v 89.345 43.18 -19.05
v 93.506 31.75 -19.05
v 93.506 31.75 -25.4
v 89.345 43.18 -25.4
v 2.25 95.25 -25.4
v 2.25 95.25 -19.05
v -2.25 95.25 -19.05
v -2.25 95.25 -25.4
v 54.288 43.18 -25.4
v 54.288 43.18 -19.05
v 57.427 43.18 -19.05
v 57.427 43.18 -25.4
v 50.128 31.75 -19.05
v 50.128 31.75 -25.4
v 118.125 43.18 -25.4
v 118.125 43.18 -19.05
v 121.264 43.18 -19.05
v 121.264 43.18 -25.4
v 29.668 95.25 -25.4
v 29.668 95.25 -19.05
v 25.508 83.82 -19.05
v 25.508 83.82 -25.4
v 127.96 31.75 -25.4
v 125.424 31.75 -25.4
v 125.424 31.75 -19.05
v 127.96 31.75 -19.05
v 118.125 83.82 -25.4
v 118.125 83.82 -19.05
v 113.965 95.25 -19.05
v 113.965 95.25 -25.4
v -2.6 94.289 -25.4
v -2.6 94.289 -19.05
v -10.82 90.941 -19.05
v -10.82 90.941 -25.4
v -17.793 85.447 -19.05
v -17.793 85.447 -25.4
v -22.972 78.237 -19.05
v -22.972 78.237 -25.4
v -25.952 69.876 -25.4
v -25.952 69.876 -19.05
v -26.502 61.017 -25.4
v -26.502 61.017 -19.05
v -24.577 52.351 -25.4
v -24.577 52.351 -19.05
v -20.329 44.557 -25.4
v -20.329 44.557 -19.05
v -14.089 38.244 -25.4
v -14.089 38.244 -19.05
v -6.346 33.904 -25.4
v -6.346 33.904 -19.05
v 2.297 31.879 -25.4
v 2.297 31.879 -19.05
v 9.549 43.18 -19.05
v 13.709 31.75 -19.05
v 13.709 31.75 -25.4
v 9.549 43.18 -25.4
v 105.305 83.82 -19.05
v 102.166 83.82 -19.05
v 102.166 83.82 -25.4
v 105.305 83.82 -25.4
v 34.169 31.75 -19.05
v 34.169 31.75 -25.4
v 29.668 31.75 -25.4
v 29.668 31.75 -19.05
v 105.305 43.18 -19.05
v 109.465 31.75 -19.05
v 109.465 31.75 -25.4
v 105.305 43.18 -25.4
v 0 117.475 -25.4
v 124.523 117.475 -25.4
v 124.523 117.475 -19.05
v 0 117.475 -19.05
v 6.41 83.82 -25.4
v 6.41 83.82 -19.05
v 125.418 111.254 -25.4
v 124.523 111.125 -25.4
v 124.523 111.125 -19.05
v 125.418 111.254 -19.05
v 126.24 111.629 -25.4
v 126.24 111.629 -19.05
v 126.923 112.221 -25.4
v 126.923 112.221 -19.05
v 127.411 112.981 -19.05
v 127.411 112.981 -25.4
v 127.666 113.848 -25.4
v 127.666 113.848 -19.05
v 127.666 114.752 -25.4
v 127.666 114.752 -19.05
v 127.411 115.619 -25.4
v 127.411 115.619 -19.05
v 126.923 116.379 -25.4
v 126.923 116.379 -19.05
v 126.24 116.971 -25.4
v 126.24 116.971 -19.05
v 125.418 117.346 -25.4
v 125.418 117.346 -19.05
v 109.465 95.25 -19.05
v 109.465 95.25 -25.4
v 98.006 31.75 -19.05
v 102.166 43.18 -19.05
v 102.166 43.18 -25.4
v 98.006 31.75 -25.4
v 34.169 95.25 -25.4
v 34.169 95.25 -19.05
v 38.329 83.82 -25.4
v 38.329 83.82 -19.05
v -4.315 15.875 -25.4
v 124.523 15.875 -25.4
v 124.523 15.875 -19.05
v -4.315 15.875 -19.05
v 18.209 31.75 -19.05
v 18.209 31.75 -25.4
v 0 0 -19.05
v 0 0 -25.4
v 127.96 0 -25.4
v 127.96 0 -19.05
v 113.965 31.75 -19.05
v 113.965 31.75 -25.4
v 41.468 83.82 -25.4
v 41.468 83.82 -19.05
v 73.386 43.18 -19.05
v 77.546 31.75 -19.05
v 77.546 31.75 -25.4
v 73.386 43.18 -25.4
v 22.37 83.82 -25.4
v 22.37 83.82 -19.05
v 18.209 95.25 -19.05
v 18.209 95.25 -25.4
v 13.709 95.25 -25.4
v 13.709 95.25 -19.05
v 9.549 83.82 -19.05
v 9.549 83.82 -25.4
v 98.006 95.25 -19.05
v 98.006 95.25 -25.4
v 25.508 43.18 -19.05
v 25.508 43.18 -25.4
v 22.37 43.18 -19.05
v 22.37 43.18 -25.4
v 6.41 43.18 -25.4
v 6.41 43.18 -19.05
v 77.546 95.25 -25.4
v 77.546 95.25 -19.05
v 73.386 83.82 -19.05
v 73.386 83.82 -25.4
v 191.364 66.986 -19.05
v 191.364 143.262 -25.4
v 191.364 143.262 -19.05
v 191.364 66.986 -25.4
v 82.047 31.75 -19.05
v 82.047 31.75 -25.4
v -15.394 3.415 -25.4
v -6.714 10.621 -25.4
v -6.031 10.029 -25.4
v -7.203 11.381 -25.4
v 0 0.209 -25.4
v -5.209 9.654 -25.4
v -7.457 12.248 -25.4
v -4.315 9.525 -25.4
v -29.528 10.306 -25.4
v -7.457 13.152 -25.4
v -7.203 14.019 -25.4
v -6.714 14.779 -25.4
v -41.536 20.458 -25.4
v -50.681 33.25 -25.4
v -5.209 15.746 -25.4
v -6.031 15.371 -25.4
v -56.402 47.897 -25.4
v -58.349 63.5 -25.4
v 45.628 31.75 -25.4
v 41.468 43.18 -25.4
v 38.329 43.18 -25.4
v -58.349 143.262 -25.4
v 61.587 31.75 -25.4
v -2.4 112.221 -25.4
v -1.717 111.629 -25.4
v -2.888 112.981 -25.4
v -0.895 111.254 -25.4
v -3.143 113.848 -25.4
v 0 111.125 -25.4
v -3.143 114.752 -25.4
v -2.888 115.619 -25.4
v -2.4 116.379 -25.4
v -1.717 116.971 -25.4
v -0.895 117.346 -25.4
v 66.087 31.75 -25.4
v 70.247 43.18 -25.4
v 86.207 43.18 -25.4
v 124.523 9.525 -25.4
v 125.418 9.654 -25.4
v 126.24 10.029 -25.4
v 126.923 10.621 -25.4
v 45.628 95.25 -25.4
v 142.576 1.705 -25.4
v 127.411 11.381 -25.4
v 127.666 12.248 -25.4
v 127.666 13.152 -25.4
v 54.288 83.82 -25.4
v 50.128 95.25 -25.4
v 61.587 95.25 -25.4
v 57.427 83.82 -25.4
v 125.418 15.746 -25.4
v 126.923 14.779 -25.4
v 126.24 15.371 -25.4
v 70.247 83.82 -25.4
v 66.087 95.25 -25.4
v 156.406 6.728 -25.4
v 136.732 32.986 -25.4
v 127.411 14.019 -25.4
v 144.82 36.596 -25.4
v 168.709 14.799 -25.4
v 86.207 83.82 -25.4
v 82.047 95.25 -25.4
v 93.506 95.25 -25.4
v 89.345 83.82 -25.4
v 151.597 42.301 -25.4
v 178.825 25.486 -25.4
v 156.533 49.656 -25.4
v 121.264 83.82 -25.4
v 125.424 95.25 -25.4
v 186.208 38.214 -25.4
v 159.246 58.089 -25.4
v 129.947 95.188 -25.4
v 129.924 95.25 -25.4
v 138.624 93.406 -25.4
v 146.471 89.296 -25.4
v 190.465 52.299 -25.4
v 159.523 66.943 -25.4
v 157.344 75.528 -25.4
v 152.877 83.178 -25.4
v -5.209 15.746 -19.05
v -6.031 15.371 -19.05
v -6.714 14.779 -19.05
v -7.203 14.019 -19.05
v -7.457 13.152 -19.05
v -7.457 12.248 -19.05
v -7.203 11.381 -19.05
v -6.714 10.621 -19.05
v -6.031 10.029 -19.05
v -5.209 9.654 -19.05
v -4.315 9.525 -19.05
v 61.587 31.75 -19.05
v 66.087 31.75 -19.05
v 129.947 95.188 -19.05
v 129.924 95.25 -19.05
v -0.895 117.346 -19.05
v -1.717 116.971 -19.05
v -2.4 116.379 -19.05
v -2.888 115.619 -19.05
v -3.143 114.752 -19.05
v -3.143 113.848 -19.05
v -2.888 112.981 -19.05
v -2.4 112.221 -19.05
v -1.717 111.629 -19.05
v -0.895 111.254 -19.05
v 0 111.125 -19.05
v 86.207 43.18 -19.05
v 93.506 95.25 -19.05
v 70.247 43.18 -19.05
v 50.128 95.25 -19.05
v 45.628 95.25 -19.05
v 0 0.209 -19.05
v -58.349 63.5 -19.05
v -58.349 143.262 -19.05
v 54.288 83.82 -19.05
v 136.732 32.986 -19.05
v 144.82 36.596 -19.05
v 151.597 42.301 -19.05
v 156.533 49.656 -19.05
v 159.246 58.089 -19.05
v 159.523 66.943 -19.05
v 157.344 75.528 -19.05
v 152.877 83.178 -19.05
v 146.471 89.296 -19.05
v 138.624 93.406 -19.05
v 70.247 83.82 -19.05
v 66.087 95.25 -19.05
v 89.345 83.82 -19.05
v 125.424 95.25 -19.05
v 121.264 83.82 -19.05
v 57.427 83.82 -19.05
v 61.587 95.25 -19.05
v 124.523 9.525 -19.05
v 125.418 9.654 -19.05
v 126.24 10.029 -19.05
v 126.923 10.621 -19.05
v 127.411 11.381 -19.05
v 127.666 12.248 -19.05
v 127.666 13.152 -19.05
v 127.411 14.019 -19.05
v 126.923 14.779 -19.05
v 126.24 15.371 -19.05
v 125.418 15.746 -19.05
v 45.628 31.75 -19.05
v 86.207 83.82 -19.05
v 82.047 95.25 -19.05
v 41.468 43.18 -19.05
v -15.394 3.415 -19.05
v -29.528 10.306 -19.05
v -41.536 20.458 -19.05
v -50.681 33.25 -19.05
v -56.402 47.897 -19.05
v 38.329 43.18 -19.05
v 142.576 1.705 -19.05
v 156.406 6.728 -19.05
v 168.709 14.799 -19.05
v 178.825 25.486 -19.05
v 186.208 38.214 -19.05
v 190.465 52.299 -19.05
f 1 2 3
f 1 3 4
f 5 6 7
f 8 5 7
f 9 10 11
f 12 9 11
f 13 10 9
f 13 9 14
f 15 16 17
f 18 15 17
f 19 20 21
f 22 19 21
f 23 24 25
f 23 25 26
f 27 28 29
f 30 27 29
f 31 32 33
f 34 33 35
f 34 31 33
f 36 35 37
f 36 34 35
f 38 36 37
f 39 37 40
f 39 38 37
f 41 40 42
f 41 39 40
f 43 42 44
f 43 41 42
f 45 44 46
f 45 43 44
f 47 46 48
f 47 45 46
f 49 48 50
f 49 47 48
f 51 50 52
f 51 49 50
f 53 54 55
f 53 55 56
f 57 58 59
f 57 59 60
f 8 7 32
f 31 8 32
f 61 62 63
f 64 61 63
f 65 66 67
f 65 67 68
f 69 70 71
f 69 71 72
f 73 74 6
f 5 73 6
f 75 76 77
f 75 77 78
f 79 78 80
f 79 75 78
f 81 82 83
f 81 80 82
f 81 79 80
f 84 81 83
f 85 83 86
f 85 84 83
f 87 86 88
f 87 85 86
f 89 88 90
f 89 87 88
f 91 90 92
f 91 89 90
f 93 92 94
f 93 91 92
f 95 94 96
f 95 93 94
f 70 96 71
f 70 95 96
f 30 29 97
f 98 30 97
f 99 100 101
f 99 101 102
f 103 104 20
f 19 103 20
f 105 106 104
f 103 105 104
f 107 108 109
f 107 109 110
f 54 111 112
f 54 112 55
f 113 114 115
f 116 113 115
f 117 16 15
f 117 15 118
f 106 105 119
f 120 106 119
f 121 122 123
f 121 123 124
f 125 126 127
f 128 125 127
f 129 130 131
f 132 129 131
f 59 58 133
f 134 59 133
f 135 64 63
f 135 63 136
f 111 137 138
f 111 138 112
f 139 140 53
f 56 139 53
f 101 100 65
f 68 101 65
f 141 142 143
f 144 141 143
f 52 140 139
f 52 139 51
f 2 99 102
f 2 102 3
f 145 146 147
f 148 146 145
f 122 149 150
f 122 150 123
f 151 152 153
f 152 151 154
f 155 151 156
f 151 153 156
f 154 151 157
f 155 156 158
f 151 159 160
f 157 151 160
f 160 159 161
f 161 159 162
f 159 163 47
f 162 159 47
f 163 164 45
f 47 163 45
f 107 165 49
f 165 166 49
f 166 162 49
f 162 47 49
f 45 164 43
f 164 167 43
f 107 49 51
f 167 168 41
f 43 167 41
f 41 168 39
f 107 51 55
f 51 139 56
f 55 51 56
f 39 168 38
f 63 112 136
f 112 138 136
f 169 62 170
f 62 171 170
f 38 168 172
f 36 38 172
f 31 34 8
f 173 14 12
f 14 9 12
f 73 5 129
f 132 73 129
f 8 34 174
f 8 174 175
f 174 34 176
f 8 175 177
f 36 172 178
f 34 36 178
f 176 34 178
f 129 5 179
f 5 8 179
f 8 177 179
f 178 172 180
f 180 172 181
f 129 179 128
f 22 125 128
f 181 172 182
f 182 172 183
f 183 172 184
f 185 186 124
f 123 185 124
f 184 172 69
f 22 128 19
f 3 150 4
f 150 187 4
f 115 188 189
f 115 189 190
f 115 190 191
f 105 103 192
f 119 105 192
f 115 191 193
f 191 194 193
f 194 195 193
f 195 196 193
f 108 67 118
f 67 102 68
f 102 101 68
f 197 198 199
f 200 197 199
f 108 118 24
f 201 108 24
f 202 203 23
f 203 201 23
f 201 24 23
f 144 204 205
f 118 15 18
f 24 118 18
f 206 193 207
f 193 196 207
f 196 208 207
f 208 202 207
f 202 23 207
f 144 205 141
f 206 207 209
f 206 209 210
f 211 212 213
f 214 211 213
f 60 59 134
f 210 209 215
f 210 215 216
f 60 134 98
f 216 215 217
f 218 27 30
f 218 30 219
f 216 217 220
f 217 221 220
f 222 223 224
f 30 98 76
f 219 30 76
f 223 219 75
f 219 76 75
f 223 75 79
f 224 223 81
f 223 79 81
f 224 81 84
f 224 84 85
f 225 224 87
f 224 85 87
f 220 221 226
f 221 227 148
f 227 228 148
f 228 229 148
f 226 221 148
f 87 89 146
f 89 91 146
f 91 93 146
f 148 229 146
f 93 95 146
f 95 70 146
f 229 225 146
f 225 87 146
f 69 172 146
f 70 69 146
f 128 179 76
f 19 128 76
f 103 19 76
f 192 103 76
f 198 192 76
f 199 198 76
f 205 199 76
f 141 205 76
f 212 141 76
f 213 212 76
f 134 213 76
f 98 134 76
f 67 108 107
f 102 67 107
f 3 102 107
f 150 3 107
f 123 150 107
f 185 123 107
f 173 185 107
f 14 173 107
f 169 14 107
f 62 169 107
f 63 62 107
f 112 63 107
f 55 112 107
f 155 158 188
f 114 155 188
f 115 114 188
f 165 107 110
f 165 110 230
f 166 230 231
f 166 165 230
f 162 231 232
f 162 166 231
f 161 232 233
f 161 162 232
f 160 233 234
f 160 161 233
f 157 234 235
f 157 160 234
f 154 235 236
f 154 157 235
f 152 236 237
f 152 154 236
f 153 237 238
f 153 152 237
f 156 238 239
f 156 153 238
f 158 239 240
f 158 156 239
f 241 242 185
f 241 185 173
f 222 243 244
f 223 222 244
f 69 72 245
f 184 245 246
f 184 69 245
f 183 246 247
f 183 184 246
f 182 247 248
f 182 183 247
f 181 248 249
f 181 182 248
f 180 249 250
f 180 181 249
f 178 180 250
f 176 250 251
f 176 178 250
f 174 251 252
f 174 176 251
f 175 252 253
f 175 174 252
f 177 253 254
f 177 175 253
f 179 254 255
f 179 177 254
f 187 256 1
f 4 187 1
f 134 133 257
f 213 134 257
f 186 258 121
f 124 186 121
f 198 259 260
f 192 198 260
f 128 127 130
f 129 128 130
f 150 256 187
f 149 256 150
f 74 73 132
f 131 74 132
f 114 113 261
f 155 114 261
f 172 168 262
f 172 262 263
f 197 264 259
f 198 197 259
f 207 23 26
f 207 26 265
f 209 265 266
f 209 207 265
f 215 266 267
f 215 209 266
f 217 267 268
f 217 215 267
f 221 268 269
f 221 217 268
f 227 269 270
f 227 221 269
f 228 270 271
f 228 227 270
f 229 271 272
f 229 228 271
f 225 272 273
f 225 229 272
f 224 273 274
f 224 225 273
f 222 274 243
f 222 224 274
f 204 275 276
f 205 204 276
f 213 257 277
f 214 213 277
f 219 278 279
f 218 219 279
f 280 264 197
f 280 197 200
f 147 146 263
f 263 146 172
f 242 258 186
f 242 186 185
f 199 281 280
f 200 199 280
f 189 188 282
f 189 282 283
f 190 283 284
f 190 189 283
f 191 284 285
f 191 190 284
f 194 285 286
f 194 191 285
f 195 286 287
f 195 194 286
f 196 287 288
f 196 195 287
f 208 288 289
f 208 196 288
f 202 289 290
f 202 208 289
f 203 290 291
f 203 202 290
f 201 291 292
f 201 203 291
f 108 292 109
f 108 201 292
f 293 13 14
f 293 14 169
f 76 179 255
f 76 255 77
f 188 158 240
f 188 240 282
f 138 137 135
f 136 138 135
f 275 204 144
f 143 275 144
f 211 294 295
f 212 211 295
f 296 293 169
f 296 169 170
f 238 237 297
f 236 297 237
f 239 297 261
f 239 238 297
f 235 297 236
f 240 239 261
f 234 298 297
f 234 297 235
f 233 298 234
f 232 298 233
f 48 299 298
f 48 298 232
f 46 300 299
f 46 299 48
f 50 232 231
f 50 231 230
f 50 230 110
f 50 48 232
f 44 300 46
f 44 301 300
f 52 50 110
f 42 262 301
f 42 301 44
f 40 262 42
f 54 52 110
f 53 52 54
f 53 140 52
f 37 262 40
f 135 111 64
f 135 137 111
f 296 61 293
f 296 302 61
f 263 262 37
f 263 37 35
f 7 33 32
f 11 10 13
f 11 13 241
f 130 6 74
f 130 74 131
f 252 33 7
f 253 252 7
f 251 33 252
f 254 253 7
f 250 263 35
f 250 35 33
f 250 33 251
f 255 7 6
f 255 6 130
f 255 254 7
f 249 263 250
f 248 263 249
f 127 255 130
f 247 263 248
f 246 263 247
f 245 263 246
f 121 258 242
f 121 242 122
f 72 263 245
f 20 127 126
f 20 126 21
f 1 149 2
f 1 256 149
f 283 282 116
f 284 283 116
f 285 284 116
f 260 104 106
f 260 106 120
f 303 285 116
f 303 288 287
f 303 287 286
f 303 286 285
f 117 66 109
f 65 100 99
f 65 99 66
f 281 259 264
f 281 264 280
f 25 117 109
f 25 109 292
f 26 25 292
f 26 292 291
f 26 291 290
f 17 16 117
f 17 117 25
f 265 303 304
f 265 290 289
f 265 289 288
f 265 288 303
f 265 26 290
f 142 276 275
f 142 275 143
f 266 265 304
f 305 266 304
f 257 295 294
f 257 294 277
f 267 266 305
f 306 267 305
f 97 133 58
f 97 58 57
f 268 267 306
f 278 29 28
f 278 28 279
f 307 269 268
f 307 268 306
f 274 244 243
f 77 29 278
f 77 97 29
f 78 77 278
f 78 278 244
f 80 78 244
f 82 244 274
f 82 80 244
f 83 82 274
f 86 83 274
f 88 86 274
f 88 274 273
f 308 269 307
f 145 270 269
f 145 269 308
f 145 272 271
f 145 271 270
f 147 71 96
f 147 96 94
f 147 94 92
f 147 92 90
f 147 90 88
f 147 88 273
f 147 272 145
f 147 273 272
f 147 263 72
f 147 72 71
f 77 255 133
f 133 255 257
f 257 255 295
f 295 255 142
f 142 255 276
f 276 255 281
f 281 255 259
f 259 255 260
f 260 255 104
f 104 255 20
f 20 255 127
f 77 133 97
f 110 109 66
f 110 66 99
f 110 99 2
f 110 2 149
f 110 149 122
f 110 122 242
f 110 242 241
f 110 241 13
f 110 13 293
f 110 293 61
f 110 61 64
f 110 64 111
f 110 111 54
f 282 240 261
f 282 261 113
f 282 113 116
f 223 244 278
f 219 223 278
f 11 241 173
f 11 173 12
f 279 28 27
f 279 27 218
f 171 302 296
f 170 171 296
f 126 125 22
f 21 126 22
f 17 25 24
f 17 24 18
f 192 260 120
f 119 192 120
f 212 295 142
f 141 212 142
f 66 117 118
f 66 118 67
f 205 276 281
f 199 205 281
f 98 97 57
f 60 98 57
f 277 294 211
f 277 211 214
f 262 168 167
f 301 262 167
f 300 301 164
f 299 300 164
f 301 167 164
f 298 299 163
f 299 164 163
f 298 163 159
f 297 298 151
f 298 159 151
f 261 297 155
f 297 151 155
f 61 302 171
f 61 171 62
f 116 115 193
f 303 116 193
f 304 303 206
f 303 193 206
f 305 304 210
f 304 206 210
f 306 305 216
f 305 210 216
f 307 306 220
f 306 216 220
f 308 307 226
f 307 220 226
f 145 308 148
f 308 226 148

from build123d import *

# Parameters (mm, degrees)
BLANKSKE_W           = 127
BLANKSKE_H           = 43.18
BLANK_DEPTH          = 25.4
TOOTHCUTSIM_DEPTH    = 137.523523248
TEETHCUTS_COUNT      = 9
TEETHCUTS_PITCH      = 15.959290662
BOSS_EXTRUDE1_DEPTH  = 25.4
MIRROR1_COPY_1_DEPTH = 137.523523248
MIRROR1_COPY_2_DEPTH = 137.523523248
MIRROR1_COPY_3_DEPTH = 137.523523248
MIRROR1_COPY_4_DEPTH = 137.523523248
MIRROR1_COPY_5_DEPTH = 137.523523248
MIRROR1_COPY_6_DEPTH = 137.523523248
MIRROR1_COPY_7_DEPTH = 137.523523248
MIRROR1_COPY_8_DEPTH = 137.523523248
CUT_EXTRUDE1_DEPTH   = 232.151804304
SKETCH5_W            = 249.809436719
SKETCH5_H            = 19.05
CUT_EXTRUDE2_DEPTH   = 232.151804304
BOSS_EXTRUDE2_DEPTH  = 6.35


with BuildPart() as part:
    # BlankSke → Blank (new body)
    with BuildSketch(Plane.XY):
        with Locations((63.5, 21.59)):
            Rectangle(BLANKSKE_W, BLANKSKE_H)
    blank = extrude(amount=-BLANK_DEPTH)

    # TooCutSkeSim → ToothCutSim (cut, through all)
    with BuildSketch(Plane.XY):
        Polygon((2.250111678, 31.75), (-2.250111678, 31.75), (-6.4195363, 43.2054), (6.4195363, 43.2054), align=None)
    toothcutsim = extrude(amount=-TOOTHCUTSIM_DEPTH, mode=Mode.SUBTRACT)

    # TeethCuts: ToothCutSim ×9
    with Locations(*[(i * TEETHCUTS_PITCH, 0, 0) for i in range(1, TEETHCUTS_COUNT)]):
        add(toothcutsim, mode=Mode.SUBTRACT)

    # Sketch3 → Boss-Extrude1 (add)
    with BuildSketch(Plane(origin=(0, 0, -25.4), x_dir=(-1, 0, 0), z_dir=(0, 0, -1))):
        with BuildLine():
            Line((-127.960169835, 127), (-5.150733116, 127))
            ThreePointArc((-5.150733116, 127), (58.349266884, 63.5), (-5.150733116, 0))
            Line((-5.150733116, 0), (-127.960169835, 0))
            ThreePointArc((-127.960169835, 0), (-191.460169835, 63.5), (-127.960169835, 127))
        make_face()
        with BuildLine():
            Line((-127.960169835, 95.25), (-5.150733116, 95.25))
            ThreePointArc((-5.150733116, 95.25), (26.599266884, 63.5), (-5.150733116, 31.75))
            Line((-5.150733116, 31.75), (-127.960169835, 31.75))
            ThreePointArc((-127.960169835, 31.75), (-159.710169835, 63.5), (-127.960169835, 95.25))
        make_face(mode=Mode.SUBTRACT)
    extrude(amount=-BOSS_EXTRUDE1_DEPTH)

    # Mirror1: Blank, ToothCutSim across plane
    add(blank.mirror(Plane.ZX.offset(63.5)))
    add(toothcutsim.mirror(Plane.ZX.offset(63.5)), mode=Mode.SUBTRACT)

    # Mirror1 copy 1 sketch → Mirror1 copy 1 (cut, through all)
    with BuildSketch(Plane(origin=(15.959290662, 127, 0), x_dir=(1, 0, 0), z_dir=(0, 0, 1))):
        Polygon((2.250111678, -31.75), (-2.250111678, -31.75), (-6.4195363, -43.2054), (6.4195363, -43.2054), align=None)
    extrude(amount=-MIRROR1_COPY_1_DEPTH, mode=Mode.SUBTRACT)

    # Mirror1 copy 2 sketch → Mirror1 copy 2 (cut, through all)
    with BuildSketch(Plane(origin=(31.918581324, 127, 0), x_dir=(1, 0, 0), z_dir=(0, 0, 1))):
        Polygon((2.250111678, -31.75), (-2.250111678, -31.75), (-6.4195363, -43.2054), (6.4195363, -43.2054), align=None)
    extrude(amount=-MIRROR1_COPY_2_DEPTH, mode=Mode.SUBTRACT)

    # Mirror1 copy 3 sketch → Mirror1 copy 3 (cut, through all)
    with BuildSketch(Plane(origin=(47.877871986, 127, 0), x_dir=(1, 0, 0), z_dir=(0, 0, 1))):
        Polygon((2.250111678, -31.75), (-2.250111678, -31.75), (-6.4195363, -43.2054), (6.4195363, -43.2054), align=None)
    extrude(amount=-MIRROR1_COPY_3_DEPTH, mode=Mode.SUBTRACT)

    # Mirror1 copy 4 sketch → Mirror1 copy 4 (cut, through all)
    with BuildSketch(Plane(origin=(63.837162648, 127, 0), x_dir=(1, 0, 0), z_dir=(0, 0, 1))):
        Polygon((2.250111678, -31.75), (-2.250111678, -31.75), (-6.4195363, -43.2054), (6.4195363, -43.2054), align=None)
    extrude(amount=-MIRROR1_COPY_4_DEPTH, mode=Mode.SUBTRACT)

    # Mirror1 copy 5 sketch → Mirror1 copy 5 (cut, through all)
    with BuildSketch(Plane(origin=(79.79645331, 127, 0), x_dir=(1, 0, 0), z_dir=(0, 0, 1))):
        Polygon((2.250111678, -31.75), (-2.250111678, -31.75), (-6.4195363, -43.2054), (6.4195363, -43.2054), align=None)
    extrude(amount=-MIRROR1_COPY_5_DEPTH, mode=Mode.SUBTRACT)

    # Mirror1 copy 6 sketch → Mirror1 copy 6 (cut, through all)
    with BuildSketch(Plane(origin=(95.755743972, 127, 0), x_dir=(1, 0, 0), z_dir=(0, 0, 1))):
        Polygon((2.250111678, -31.75), (-2.250111678, -31.75), (-6.4195363, -43.2054), (6.4195363, -43.2054), align=None)
    extrude(amount=-MIRROR1_COPY_6_DEPTH, mode=Mode.SUBTRACT)

    # Mirror1 copy 7 sketch → Mirror1 copy 7 (cut, through all)
    with BuildSketch(Plane(origin=(111.715034634, 127, 0), x_dir=(1, 0, 0), z_dir=(0, 0, 1))):
        Polygon((2.250111678, -31.75), (-2.250111678, -31.75), (-6.4195363, -43.2054), (6.4195363, -43.2054), align=None)
    extrude(amount=-MIRROR1_COPY_7_DEPTH, mode=Mode.SUBTRACT)

    # Mirror1 copy 8 sketch → Mirror1 copy 8 (cut, through all)
    with BuildSketch(Plane(origin=(127.674325296, 127, 0), x_dir=(1, 0, 0), z_dir=(0, 0, 1))):
        Polygon((2.250111678, -31.75), (-2.250111678, -31.75), (-6.4195363, -43.2054), (6.4195363, -43.2054), align=None)
    extrude(amount=-MIRROR1_COPY_8_DEPTH, mode=Mode.SUBTRACT)

    # Sketch4 → Cut-Extrude1 (cut, through all)
    with BuildSketch(Plane(origin=(0, 0, -25.4), x_dir=(-1, 0, 0), z_dir=(0, 0, -1))):
        with BuildLine():
            Line((4.314647241, 9.525), (-124.523078394, 9.525))
            ThreePointArc((-124.523078394, 9.525), (-127.698078394, 12.7), (-124.523078394, 15.875))
            Line((-124.523078394, 15.875), (4.314647241, 15.875))
            ThreePointArc((4.314647241, 15.875), (7.489647241, 12.7), (4.314647241, 9.525))
        make_face()
        with BuildLine():
            Line((0, 111.125), (-124.523078394, 111.125))
            ThreePointArc((-124.523078394, 111.125), (-127.698078394, 114.3), (-124.523078394, 117.475))
            Line((-124.523078394, 117.475), (0, 117.475))
            ThreePointArc((0, 117.475), (3.175, 114.3), (0, 111.125))
        make_face()
    extrude(amount=-CUT_EXTRUDE1_DEPTH, mode=Mode.SUBTRACT)

    # Sketch5 → Cut-Extrude2 (cut, through all)
    with BuildSketch(Plane(origin=(0, 0, 0), x_dir=(1, 0, 0), z_dir=(0, 1, 0))):
        with Locations((66.555451476, 9.525)):
            Rectangle(SKETCH5_W, SKETCH5_H)
    extrude(amount=CUT_EXTRUDE2_DEPTH, mode=Mode.SUBTRACT)

    # Sketch6 → Boss-Extrude2 (add)
    with BuildSketch(Plane(origin=(0, 0, -25.4), x_dir=(-1, 0, 0), z_dir=(0, 0, -1))):
        Polygon((-191.364398064, 117.861523458), (-191.364398064, 143.261523458), (58.349266884, 143.261523458), (58.349266884, 117.861523458), (58.349266884, 63.5), (13.664264486, 117.861523458), (-144.531259298, 117.861523458), (-191.364398064, 66.98623618), align=None)
    extrude(amount=-BOSS_EXTRUDE2_DEPTH)


solid = part.part
